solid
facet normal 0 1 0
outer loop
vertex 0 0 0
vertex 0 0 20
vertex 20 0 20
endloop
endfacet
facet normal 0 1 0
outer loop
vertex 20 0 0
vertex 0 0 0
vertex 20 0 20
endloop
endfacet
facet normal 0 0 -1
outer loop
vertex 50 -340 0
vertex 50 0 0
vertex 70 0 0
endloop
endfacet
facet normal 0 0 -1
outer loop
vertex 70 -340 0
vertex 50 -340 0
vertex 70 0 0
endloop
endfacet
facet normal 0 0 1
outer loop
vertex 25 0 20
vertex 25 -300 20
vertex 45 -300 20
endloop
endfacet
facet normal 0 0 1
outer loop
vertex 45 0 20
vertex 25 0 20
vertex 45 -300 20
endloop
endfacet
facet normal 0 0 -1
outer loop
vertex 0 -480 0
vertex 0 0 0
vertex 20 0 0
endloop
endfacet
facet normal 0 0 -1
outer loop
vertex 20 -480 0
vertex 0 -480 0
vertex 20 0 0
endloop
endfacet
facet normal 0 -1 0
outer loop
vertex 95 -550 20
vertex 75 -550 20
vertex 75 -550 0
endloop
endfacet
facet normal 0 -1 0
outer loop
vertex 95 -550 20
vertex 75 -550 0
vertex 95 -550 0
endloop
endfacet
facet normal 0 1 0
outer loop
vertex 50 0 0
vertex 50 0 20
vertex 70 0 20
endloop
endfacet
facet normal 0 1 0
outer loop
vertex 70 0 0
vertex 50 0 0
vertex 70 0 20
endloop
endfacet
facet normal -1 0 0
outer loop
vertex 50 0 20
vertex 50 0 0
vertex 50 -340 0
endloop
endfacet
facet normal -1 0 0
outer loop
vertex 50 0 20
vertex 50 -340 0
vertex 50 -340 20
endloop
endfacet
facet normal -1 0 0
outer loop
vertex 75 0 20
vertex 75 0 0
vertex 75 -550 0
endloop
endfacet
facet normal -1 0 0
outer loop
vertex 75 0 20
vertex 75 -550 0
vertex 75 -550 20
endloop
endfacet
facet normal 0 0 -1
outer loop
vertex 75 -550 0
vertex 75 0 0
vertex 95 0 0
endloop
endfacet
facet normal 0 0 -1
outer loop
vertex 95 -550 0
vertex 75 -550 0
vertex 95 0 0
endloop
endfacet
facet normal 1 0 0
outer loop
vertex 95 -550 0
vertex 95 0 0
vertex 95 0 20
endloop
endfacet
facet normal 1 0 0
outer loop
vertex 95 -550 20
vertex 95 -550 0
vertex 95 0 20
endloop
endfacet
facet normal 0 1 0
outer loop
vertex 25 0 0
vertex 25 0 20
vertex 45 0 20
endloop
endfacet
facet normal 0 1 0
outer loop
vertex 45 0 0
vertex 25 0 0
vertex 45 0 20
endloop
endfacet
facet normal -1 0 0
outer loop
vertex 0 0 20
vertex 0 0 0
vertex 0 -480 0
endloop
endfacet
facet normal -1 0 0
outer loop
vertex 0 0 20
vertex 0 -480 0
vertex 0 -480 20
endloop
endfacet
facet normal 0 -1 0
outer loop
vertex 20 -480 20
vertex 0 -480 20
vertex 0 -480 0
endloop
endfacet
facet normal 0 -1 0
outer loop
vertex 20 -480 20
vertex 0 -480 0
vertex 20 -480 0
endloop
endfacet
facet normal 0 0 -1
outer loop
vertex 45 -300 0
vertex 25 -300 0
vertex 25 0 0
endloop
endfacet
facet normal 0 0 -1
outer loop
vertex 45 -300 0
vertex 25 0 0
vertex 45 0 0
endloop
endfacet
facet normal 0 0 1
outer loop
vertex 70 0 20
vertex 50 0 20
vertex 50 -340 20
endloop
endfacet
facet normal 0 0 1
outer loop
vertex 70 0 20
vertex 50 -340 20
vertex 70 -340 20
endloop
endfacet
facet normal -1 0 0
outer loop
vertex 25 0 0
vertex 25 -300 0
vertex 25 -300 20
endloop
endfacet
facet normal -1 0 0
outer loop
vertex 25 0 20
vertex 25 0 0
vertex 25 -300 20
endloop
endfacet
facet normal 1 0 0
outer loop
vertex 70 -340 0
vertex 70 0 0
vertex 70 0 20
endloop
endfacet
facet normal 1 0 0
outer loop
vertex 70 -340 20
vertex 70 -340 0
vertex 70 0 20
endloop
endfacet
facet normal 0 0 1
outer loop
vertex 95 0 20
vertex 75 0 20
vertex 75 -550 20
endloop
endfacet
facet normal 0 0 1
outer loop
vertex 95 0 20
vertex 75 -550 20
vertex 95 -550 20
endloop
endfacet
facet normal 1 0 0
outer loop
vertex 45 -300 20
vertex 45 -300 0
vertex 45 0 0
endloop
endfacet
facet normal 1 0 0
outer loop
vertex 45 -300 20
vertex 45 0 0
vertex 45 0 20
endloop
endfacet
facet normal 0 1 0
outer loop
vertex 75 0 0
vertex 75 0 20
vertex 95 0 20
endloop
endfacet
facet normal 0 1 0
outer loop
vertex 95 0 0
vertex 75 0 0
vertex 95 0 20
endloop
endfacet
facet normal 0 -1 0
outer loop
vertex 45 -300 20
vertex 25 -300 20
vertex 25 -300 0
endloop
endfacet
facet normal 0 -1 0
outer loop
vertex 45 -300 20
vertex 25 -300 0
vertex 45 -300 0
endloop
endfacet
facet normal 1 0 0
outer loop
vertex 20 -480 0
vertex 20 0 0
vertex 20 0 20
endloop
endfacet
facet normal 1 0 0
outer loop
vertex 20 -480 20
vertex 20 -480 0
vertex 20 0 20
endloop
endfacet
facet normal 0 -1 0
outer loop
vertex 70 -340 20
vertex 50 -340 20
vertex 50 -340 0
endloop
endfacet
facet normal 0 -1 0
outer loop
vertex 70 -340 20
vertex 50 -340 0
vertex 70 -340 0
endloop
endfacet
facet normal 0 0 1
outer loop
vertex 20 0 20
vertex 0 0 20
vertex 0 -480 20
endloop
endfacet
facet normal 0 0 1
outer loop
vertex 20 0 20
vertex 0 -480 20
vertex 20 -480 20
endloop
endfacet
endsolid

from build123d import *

# Parameters (mm, degrees)
F0_W     = 20
F0_H     = 20
F1_DEPTH = 480
F2_DEPTH = 300
F3_DEPTH = 340
F4_DEPTH = 550


with BuildPart() as f1:
    # F0 (on Front) → F1 (new body)
    with BuildSketch(Plane.XZ):
        with Locations((10, 10)):
            Rectangle(F0_W, F0_H)
    extrude(amount=F1_DEPTH)


with BuildPart() as f2:
    # F0 (on Front) → F2 (new body)
    with BuildSketch(Plane.XZ):
        with Locations((35, 10)):
            Rectangle(F0_W, F0_H)
    extrude(amount=F2_DEPTH)


with BuildPart() as f3:
    # F0 (on Front) → F3 (new body)
    with BuildSketch(Plane.XZ):
        with Locations((60, 10)):
            Rectangle(F0_W, F0_H)
    extrude(amount=F3_DEPTH)


with BuildPart() as f4:
    # F0 (on Front) → F4 (new body)
    with BuildSketch(Plane.XZ):
        with Locations((85, 10)):
            Rectangle(F0_W, F0_H)
    extrude(amount=F4_DEPTH)


solid = Compound([f1.part, f2.part, f3.part, f4.part])
